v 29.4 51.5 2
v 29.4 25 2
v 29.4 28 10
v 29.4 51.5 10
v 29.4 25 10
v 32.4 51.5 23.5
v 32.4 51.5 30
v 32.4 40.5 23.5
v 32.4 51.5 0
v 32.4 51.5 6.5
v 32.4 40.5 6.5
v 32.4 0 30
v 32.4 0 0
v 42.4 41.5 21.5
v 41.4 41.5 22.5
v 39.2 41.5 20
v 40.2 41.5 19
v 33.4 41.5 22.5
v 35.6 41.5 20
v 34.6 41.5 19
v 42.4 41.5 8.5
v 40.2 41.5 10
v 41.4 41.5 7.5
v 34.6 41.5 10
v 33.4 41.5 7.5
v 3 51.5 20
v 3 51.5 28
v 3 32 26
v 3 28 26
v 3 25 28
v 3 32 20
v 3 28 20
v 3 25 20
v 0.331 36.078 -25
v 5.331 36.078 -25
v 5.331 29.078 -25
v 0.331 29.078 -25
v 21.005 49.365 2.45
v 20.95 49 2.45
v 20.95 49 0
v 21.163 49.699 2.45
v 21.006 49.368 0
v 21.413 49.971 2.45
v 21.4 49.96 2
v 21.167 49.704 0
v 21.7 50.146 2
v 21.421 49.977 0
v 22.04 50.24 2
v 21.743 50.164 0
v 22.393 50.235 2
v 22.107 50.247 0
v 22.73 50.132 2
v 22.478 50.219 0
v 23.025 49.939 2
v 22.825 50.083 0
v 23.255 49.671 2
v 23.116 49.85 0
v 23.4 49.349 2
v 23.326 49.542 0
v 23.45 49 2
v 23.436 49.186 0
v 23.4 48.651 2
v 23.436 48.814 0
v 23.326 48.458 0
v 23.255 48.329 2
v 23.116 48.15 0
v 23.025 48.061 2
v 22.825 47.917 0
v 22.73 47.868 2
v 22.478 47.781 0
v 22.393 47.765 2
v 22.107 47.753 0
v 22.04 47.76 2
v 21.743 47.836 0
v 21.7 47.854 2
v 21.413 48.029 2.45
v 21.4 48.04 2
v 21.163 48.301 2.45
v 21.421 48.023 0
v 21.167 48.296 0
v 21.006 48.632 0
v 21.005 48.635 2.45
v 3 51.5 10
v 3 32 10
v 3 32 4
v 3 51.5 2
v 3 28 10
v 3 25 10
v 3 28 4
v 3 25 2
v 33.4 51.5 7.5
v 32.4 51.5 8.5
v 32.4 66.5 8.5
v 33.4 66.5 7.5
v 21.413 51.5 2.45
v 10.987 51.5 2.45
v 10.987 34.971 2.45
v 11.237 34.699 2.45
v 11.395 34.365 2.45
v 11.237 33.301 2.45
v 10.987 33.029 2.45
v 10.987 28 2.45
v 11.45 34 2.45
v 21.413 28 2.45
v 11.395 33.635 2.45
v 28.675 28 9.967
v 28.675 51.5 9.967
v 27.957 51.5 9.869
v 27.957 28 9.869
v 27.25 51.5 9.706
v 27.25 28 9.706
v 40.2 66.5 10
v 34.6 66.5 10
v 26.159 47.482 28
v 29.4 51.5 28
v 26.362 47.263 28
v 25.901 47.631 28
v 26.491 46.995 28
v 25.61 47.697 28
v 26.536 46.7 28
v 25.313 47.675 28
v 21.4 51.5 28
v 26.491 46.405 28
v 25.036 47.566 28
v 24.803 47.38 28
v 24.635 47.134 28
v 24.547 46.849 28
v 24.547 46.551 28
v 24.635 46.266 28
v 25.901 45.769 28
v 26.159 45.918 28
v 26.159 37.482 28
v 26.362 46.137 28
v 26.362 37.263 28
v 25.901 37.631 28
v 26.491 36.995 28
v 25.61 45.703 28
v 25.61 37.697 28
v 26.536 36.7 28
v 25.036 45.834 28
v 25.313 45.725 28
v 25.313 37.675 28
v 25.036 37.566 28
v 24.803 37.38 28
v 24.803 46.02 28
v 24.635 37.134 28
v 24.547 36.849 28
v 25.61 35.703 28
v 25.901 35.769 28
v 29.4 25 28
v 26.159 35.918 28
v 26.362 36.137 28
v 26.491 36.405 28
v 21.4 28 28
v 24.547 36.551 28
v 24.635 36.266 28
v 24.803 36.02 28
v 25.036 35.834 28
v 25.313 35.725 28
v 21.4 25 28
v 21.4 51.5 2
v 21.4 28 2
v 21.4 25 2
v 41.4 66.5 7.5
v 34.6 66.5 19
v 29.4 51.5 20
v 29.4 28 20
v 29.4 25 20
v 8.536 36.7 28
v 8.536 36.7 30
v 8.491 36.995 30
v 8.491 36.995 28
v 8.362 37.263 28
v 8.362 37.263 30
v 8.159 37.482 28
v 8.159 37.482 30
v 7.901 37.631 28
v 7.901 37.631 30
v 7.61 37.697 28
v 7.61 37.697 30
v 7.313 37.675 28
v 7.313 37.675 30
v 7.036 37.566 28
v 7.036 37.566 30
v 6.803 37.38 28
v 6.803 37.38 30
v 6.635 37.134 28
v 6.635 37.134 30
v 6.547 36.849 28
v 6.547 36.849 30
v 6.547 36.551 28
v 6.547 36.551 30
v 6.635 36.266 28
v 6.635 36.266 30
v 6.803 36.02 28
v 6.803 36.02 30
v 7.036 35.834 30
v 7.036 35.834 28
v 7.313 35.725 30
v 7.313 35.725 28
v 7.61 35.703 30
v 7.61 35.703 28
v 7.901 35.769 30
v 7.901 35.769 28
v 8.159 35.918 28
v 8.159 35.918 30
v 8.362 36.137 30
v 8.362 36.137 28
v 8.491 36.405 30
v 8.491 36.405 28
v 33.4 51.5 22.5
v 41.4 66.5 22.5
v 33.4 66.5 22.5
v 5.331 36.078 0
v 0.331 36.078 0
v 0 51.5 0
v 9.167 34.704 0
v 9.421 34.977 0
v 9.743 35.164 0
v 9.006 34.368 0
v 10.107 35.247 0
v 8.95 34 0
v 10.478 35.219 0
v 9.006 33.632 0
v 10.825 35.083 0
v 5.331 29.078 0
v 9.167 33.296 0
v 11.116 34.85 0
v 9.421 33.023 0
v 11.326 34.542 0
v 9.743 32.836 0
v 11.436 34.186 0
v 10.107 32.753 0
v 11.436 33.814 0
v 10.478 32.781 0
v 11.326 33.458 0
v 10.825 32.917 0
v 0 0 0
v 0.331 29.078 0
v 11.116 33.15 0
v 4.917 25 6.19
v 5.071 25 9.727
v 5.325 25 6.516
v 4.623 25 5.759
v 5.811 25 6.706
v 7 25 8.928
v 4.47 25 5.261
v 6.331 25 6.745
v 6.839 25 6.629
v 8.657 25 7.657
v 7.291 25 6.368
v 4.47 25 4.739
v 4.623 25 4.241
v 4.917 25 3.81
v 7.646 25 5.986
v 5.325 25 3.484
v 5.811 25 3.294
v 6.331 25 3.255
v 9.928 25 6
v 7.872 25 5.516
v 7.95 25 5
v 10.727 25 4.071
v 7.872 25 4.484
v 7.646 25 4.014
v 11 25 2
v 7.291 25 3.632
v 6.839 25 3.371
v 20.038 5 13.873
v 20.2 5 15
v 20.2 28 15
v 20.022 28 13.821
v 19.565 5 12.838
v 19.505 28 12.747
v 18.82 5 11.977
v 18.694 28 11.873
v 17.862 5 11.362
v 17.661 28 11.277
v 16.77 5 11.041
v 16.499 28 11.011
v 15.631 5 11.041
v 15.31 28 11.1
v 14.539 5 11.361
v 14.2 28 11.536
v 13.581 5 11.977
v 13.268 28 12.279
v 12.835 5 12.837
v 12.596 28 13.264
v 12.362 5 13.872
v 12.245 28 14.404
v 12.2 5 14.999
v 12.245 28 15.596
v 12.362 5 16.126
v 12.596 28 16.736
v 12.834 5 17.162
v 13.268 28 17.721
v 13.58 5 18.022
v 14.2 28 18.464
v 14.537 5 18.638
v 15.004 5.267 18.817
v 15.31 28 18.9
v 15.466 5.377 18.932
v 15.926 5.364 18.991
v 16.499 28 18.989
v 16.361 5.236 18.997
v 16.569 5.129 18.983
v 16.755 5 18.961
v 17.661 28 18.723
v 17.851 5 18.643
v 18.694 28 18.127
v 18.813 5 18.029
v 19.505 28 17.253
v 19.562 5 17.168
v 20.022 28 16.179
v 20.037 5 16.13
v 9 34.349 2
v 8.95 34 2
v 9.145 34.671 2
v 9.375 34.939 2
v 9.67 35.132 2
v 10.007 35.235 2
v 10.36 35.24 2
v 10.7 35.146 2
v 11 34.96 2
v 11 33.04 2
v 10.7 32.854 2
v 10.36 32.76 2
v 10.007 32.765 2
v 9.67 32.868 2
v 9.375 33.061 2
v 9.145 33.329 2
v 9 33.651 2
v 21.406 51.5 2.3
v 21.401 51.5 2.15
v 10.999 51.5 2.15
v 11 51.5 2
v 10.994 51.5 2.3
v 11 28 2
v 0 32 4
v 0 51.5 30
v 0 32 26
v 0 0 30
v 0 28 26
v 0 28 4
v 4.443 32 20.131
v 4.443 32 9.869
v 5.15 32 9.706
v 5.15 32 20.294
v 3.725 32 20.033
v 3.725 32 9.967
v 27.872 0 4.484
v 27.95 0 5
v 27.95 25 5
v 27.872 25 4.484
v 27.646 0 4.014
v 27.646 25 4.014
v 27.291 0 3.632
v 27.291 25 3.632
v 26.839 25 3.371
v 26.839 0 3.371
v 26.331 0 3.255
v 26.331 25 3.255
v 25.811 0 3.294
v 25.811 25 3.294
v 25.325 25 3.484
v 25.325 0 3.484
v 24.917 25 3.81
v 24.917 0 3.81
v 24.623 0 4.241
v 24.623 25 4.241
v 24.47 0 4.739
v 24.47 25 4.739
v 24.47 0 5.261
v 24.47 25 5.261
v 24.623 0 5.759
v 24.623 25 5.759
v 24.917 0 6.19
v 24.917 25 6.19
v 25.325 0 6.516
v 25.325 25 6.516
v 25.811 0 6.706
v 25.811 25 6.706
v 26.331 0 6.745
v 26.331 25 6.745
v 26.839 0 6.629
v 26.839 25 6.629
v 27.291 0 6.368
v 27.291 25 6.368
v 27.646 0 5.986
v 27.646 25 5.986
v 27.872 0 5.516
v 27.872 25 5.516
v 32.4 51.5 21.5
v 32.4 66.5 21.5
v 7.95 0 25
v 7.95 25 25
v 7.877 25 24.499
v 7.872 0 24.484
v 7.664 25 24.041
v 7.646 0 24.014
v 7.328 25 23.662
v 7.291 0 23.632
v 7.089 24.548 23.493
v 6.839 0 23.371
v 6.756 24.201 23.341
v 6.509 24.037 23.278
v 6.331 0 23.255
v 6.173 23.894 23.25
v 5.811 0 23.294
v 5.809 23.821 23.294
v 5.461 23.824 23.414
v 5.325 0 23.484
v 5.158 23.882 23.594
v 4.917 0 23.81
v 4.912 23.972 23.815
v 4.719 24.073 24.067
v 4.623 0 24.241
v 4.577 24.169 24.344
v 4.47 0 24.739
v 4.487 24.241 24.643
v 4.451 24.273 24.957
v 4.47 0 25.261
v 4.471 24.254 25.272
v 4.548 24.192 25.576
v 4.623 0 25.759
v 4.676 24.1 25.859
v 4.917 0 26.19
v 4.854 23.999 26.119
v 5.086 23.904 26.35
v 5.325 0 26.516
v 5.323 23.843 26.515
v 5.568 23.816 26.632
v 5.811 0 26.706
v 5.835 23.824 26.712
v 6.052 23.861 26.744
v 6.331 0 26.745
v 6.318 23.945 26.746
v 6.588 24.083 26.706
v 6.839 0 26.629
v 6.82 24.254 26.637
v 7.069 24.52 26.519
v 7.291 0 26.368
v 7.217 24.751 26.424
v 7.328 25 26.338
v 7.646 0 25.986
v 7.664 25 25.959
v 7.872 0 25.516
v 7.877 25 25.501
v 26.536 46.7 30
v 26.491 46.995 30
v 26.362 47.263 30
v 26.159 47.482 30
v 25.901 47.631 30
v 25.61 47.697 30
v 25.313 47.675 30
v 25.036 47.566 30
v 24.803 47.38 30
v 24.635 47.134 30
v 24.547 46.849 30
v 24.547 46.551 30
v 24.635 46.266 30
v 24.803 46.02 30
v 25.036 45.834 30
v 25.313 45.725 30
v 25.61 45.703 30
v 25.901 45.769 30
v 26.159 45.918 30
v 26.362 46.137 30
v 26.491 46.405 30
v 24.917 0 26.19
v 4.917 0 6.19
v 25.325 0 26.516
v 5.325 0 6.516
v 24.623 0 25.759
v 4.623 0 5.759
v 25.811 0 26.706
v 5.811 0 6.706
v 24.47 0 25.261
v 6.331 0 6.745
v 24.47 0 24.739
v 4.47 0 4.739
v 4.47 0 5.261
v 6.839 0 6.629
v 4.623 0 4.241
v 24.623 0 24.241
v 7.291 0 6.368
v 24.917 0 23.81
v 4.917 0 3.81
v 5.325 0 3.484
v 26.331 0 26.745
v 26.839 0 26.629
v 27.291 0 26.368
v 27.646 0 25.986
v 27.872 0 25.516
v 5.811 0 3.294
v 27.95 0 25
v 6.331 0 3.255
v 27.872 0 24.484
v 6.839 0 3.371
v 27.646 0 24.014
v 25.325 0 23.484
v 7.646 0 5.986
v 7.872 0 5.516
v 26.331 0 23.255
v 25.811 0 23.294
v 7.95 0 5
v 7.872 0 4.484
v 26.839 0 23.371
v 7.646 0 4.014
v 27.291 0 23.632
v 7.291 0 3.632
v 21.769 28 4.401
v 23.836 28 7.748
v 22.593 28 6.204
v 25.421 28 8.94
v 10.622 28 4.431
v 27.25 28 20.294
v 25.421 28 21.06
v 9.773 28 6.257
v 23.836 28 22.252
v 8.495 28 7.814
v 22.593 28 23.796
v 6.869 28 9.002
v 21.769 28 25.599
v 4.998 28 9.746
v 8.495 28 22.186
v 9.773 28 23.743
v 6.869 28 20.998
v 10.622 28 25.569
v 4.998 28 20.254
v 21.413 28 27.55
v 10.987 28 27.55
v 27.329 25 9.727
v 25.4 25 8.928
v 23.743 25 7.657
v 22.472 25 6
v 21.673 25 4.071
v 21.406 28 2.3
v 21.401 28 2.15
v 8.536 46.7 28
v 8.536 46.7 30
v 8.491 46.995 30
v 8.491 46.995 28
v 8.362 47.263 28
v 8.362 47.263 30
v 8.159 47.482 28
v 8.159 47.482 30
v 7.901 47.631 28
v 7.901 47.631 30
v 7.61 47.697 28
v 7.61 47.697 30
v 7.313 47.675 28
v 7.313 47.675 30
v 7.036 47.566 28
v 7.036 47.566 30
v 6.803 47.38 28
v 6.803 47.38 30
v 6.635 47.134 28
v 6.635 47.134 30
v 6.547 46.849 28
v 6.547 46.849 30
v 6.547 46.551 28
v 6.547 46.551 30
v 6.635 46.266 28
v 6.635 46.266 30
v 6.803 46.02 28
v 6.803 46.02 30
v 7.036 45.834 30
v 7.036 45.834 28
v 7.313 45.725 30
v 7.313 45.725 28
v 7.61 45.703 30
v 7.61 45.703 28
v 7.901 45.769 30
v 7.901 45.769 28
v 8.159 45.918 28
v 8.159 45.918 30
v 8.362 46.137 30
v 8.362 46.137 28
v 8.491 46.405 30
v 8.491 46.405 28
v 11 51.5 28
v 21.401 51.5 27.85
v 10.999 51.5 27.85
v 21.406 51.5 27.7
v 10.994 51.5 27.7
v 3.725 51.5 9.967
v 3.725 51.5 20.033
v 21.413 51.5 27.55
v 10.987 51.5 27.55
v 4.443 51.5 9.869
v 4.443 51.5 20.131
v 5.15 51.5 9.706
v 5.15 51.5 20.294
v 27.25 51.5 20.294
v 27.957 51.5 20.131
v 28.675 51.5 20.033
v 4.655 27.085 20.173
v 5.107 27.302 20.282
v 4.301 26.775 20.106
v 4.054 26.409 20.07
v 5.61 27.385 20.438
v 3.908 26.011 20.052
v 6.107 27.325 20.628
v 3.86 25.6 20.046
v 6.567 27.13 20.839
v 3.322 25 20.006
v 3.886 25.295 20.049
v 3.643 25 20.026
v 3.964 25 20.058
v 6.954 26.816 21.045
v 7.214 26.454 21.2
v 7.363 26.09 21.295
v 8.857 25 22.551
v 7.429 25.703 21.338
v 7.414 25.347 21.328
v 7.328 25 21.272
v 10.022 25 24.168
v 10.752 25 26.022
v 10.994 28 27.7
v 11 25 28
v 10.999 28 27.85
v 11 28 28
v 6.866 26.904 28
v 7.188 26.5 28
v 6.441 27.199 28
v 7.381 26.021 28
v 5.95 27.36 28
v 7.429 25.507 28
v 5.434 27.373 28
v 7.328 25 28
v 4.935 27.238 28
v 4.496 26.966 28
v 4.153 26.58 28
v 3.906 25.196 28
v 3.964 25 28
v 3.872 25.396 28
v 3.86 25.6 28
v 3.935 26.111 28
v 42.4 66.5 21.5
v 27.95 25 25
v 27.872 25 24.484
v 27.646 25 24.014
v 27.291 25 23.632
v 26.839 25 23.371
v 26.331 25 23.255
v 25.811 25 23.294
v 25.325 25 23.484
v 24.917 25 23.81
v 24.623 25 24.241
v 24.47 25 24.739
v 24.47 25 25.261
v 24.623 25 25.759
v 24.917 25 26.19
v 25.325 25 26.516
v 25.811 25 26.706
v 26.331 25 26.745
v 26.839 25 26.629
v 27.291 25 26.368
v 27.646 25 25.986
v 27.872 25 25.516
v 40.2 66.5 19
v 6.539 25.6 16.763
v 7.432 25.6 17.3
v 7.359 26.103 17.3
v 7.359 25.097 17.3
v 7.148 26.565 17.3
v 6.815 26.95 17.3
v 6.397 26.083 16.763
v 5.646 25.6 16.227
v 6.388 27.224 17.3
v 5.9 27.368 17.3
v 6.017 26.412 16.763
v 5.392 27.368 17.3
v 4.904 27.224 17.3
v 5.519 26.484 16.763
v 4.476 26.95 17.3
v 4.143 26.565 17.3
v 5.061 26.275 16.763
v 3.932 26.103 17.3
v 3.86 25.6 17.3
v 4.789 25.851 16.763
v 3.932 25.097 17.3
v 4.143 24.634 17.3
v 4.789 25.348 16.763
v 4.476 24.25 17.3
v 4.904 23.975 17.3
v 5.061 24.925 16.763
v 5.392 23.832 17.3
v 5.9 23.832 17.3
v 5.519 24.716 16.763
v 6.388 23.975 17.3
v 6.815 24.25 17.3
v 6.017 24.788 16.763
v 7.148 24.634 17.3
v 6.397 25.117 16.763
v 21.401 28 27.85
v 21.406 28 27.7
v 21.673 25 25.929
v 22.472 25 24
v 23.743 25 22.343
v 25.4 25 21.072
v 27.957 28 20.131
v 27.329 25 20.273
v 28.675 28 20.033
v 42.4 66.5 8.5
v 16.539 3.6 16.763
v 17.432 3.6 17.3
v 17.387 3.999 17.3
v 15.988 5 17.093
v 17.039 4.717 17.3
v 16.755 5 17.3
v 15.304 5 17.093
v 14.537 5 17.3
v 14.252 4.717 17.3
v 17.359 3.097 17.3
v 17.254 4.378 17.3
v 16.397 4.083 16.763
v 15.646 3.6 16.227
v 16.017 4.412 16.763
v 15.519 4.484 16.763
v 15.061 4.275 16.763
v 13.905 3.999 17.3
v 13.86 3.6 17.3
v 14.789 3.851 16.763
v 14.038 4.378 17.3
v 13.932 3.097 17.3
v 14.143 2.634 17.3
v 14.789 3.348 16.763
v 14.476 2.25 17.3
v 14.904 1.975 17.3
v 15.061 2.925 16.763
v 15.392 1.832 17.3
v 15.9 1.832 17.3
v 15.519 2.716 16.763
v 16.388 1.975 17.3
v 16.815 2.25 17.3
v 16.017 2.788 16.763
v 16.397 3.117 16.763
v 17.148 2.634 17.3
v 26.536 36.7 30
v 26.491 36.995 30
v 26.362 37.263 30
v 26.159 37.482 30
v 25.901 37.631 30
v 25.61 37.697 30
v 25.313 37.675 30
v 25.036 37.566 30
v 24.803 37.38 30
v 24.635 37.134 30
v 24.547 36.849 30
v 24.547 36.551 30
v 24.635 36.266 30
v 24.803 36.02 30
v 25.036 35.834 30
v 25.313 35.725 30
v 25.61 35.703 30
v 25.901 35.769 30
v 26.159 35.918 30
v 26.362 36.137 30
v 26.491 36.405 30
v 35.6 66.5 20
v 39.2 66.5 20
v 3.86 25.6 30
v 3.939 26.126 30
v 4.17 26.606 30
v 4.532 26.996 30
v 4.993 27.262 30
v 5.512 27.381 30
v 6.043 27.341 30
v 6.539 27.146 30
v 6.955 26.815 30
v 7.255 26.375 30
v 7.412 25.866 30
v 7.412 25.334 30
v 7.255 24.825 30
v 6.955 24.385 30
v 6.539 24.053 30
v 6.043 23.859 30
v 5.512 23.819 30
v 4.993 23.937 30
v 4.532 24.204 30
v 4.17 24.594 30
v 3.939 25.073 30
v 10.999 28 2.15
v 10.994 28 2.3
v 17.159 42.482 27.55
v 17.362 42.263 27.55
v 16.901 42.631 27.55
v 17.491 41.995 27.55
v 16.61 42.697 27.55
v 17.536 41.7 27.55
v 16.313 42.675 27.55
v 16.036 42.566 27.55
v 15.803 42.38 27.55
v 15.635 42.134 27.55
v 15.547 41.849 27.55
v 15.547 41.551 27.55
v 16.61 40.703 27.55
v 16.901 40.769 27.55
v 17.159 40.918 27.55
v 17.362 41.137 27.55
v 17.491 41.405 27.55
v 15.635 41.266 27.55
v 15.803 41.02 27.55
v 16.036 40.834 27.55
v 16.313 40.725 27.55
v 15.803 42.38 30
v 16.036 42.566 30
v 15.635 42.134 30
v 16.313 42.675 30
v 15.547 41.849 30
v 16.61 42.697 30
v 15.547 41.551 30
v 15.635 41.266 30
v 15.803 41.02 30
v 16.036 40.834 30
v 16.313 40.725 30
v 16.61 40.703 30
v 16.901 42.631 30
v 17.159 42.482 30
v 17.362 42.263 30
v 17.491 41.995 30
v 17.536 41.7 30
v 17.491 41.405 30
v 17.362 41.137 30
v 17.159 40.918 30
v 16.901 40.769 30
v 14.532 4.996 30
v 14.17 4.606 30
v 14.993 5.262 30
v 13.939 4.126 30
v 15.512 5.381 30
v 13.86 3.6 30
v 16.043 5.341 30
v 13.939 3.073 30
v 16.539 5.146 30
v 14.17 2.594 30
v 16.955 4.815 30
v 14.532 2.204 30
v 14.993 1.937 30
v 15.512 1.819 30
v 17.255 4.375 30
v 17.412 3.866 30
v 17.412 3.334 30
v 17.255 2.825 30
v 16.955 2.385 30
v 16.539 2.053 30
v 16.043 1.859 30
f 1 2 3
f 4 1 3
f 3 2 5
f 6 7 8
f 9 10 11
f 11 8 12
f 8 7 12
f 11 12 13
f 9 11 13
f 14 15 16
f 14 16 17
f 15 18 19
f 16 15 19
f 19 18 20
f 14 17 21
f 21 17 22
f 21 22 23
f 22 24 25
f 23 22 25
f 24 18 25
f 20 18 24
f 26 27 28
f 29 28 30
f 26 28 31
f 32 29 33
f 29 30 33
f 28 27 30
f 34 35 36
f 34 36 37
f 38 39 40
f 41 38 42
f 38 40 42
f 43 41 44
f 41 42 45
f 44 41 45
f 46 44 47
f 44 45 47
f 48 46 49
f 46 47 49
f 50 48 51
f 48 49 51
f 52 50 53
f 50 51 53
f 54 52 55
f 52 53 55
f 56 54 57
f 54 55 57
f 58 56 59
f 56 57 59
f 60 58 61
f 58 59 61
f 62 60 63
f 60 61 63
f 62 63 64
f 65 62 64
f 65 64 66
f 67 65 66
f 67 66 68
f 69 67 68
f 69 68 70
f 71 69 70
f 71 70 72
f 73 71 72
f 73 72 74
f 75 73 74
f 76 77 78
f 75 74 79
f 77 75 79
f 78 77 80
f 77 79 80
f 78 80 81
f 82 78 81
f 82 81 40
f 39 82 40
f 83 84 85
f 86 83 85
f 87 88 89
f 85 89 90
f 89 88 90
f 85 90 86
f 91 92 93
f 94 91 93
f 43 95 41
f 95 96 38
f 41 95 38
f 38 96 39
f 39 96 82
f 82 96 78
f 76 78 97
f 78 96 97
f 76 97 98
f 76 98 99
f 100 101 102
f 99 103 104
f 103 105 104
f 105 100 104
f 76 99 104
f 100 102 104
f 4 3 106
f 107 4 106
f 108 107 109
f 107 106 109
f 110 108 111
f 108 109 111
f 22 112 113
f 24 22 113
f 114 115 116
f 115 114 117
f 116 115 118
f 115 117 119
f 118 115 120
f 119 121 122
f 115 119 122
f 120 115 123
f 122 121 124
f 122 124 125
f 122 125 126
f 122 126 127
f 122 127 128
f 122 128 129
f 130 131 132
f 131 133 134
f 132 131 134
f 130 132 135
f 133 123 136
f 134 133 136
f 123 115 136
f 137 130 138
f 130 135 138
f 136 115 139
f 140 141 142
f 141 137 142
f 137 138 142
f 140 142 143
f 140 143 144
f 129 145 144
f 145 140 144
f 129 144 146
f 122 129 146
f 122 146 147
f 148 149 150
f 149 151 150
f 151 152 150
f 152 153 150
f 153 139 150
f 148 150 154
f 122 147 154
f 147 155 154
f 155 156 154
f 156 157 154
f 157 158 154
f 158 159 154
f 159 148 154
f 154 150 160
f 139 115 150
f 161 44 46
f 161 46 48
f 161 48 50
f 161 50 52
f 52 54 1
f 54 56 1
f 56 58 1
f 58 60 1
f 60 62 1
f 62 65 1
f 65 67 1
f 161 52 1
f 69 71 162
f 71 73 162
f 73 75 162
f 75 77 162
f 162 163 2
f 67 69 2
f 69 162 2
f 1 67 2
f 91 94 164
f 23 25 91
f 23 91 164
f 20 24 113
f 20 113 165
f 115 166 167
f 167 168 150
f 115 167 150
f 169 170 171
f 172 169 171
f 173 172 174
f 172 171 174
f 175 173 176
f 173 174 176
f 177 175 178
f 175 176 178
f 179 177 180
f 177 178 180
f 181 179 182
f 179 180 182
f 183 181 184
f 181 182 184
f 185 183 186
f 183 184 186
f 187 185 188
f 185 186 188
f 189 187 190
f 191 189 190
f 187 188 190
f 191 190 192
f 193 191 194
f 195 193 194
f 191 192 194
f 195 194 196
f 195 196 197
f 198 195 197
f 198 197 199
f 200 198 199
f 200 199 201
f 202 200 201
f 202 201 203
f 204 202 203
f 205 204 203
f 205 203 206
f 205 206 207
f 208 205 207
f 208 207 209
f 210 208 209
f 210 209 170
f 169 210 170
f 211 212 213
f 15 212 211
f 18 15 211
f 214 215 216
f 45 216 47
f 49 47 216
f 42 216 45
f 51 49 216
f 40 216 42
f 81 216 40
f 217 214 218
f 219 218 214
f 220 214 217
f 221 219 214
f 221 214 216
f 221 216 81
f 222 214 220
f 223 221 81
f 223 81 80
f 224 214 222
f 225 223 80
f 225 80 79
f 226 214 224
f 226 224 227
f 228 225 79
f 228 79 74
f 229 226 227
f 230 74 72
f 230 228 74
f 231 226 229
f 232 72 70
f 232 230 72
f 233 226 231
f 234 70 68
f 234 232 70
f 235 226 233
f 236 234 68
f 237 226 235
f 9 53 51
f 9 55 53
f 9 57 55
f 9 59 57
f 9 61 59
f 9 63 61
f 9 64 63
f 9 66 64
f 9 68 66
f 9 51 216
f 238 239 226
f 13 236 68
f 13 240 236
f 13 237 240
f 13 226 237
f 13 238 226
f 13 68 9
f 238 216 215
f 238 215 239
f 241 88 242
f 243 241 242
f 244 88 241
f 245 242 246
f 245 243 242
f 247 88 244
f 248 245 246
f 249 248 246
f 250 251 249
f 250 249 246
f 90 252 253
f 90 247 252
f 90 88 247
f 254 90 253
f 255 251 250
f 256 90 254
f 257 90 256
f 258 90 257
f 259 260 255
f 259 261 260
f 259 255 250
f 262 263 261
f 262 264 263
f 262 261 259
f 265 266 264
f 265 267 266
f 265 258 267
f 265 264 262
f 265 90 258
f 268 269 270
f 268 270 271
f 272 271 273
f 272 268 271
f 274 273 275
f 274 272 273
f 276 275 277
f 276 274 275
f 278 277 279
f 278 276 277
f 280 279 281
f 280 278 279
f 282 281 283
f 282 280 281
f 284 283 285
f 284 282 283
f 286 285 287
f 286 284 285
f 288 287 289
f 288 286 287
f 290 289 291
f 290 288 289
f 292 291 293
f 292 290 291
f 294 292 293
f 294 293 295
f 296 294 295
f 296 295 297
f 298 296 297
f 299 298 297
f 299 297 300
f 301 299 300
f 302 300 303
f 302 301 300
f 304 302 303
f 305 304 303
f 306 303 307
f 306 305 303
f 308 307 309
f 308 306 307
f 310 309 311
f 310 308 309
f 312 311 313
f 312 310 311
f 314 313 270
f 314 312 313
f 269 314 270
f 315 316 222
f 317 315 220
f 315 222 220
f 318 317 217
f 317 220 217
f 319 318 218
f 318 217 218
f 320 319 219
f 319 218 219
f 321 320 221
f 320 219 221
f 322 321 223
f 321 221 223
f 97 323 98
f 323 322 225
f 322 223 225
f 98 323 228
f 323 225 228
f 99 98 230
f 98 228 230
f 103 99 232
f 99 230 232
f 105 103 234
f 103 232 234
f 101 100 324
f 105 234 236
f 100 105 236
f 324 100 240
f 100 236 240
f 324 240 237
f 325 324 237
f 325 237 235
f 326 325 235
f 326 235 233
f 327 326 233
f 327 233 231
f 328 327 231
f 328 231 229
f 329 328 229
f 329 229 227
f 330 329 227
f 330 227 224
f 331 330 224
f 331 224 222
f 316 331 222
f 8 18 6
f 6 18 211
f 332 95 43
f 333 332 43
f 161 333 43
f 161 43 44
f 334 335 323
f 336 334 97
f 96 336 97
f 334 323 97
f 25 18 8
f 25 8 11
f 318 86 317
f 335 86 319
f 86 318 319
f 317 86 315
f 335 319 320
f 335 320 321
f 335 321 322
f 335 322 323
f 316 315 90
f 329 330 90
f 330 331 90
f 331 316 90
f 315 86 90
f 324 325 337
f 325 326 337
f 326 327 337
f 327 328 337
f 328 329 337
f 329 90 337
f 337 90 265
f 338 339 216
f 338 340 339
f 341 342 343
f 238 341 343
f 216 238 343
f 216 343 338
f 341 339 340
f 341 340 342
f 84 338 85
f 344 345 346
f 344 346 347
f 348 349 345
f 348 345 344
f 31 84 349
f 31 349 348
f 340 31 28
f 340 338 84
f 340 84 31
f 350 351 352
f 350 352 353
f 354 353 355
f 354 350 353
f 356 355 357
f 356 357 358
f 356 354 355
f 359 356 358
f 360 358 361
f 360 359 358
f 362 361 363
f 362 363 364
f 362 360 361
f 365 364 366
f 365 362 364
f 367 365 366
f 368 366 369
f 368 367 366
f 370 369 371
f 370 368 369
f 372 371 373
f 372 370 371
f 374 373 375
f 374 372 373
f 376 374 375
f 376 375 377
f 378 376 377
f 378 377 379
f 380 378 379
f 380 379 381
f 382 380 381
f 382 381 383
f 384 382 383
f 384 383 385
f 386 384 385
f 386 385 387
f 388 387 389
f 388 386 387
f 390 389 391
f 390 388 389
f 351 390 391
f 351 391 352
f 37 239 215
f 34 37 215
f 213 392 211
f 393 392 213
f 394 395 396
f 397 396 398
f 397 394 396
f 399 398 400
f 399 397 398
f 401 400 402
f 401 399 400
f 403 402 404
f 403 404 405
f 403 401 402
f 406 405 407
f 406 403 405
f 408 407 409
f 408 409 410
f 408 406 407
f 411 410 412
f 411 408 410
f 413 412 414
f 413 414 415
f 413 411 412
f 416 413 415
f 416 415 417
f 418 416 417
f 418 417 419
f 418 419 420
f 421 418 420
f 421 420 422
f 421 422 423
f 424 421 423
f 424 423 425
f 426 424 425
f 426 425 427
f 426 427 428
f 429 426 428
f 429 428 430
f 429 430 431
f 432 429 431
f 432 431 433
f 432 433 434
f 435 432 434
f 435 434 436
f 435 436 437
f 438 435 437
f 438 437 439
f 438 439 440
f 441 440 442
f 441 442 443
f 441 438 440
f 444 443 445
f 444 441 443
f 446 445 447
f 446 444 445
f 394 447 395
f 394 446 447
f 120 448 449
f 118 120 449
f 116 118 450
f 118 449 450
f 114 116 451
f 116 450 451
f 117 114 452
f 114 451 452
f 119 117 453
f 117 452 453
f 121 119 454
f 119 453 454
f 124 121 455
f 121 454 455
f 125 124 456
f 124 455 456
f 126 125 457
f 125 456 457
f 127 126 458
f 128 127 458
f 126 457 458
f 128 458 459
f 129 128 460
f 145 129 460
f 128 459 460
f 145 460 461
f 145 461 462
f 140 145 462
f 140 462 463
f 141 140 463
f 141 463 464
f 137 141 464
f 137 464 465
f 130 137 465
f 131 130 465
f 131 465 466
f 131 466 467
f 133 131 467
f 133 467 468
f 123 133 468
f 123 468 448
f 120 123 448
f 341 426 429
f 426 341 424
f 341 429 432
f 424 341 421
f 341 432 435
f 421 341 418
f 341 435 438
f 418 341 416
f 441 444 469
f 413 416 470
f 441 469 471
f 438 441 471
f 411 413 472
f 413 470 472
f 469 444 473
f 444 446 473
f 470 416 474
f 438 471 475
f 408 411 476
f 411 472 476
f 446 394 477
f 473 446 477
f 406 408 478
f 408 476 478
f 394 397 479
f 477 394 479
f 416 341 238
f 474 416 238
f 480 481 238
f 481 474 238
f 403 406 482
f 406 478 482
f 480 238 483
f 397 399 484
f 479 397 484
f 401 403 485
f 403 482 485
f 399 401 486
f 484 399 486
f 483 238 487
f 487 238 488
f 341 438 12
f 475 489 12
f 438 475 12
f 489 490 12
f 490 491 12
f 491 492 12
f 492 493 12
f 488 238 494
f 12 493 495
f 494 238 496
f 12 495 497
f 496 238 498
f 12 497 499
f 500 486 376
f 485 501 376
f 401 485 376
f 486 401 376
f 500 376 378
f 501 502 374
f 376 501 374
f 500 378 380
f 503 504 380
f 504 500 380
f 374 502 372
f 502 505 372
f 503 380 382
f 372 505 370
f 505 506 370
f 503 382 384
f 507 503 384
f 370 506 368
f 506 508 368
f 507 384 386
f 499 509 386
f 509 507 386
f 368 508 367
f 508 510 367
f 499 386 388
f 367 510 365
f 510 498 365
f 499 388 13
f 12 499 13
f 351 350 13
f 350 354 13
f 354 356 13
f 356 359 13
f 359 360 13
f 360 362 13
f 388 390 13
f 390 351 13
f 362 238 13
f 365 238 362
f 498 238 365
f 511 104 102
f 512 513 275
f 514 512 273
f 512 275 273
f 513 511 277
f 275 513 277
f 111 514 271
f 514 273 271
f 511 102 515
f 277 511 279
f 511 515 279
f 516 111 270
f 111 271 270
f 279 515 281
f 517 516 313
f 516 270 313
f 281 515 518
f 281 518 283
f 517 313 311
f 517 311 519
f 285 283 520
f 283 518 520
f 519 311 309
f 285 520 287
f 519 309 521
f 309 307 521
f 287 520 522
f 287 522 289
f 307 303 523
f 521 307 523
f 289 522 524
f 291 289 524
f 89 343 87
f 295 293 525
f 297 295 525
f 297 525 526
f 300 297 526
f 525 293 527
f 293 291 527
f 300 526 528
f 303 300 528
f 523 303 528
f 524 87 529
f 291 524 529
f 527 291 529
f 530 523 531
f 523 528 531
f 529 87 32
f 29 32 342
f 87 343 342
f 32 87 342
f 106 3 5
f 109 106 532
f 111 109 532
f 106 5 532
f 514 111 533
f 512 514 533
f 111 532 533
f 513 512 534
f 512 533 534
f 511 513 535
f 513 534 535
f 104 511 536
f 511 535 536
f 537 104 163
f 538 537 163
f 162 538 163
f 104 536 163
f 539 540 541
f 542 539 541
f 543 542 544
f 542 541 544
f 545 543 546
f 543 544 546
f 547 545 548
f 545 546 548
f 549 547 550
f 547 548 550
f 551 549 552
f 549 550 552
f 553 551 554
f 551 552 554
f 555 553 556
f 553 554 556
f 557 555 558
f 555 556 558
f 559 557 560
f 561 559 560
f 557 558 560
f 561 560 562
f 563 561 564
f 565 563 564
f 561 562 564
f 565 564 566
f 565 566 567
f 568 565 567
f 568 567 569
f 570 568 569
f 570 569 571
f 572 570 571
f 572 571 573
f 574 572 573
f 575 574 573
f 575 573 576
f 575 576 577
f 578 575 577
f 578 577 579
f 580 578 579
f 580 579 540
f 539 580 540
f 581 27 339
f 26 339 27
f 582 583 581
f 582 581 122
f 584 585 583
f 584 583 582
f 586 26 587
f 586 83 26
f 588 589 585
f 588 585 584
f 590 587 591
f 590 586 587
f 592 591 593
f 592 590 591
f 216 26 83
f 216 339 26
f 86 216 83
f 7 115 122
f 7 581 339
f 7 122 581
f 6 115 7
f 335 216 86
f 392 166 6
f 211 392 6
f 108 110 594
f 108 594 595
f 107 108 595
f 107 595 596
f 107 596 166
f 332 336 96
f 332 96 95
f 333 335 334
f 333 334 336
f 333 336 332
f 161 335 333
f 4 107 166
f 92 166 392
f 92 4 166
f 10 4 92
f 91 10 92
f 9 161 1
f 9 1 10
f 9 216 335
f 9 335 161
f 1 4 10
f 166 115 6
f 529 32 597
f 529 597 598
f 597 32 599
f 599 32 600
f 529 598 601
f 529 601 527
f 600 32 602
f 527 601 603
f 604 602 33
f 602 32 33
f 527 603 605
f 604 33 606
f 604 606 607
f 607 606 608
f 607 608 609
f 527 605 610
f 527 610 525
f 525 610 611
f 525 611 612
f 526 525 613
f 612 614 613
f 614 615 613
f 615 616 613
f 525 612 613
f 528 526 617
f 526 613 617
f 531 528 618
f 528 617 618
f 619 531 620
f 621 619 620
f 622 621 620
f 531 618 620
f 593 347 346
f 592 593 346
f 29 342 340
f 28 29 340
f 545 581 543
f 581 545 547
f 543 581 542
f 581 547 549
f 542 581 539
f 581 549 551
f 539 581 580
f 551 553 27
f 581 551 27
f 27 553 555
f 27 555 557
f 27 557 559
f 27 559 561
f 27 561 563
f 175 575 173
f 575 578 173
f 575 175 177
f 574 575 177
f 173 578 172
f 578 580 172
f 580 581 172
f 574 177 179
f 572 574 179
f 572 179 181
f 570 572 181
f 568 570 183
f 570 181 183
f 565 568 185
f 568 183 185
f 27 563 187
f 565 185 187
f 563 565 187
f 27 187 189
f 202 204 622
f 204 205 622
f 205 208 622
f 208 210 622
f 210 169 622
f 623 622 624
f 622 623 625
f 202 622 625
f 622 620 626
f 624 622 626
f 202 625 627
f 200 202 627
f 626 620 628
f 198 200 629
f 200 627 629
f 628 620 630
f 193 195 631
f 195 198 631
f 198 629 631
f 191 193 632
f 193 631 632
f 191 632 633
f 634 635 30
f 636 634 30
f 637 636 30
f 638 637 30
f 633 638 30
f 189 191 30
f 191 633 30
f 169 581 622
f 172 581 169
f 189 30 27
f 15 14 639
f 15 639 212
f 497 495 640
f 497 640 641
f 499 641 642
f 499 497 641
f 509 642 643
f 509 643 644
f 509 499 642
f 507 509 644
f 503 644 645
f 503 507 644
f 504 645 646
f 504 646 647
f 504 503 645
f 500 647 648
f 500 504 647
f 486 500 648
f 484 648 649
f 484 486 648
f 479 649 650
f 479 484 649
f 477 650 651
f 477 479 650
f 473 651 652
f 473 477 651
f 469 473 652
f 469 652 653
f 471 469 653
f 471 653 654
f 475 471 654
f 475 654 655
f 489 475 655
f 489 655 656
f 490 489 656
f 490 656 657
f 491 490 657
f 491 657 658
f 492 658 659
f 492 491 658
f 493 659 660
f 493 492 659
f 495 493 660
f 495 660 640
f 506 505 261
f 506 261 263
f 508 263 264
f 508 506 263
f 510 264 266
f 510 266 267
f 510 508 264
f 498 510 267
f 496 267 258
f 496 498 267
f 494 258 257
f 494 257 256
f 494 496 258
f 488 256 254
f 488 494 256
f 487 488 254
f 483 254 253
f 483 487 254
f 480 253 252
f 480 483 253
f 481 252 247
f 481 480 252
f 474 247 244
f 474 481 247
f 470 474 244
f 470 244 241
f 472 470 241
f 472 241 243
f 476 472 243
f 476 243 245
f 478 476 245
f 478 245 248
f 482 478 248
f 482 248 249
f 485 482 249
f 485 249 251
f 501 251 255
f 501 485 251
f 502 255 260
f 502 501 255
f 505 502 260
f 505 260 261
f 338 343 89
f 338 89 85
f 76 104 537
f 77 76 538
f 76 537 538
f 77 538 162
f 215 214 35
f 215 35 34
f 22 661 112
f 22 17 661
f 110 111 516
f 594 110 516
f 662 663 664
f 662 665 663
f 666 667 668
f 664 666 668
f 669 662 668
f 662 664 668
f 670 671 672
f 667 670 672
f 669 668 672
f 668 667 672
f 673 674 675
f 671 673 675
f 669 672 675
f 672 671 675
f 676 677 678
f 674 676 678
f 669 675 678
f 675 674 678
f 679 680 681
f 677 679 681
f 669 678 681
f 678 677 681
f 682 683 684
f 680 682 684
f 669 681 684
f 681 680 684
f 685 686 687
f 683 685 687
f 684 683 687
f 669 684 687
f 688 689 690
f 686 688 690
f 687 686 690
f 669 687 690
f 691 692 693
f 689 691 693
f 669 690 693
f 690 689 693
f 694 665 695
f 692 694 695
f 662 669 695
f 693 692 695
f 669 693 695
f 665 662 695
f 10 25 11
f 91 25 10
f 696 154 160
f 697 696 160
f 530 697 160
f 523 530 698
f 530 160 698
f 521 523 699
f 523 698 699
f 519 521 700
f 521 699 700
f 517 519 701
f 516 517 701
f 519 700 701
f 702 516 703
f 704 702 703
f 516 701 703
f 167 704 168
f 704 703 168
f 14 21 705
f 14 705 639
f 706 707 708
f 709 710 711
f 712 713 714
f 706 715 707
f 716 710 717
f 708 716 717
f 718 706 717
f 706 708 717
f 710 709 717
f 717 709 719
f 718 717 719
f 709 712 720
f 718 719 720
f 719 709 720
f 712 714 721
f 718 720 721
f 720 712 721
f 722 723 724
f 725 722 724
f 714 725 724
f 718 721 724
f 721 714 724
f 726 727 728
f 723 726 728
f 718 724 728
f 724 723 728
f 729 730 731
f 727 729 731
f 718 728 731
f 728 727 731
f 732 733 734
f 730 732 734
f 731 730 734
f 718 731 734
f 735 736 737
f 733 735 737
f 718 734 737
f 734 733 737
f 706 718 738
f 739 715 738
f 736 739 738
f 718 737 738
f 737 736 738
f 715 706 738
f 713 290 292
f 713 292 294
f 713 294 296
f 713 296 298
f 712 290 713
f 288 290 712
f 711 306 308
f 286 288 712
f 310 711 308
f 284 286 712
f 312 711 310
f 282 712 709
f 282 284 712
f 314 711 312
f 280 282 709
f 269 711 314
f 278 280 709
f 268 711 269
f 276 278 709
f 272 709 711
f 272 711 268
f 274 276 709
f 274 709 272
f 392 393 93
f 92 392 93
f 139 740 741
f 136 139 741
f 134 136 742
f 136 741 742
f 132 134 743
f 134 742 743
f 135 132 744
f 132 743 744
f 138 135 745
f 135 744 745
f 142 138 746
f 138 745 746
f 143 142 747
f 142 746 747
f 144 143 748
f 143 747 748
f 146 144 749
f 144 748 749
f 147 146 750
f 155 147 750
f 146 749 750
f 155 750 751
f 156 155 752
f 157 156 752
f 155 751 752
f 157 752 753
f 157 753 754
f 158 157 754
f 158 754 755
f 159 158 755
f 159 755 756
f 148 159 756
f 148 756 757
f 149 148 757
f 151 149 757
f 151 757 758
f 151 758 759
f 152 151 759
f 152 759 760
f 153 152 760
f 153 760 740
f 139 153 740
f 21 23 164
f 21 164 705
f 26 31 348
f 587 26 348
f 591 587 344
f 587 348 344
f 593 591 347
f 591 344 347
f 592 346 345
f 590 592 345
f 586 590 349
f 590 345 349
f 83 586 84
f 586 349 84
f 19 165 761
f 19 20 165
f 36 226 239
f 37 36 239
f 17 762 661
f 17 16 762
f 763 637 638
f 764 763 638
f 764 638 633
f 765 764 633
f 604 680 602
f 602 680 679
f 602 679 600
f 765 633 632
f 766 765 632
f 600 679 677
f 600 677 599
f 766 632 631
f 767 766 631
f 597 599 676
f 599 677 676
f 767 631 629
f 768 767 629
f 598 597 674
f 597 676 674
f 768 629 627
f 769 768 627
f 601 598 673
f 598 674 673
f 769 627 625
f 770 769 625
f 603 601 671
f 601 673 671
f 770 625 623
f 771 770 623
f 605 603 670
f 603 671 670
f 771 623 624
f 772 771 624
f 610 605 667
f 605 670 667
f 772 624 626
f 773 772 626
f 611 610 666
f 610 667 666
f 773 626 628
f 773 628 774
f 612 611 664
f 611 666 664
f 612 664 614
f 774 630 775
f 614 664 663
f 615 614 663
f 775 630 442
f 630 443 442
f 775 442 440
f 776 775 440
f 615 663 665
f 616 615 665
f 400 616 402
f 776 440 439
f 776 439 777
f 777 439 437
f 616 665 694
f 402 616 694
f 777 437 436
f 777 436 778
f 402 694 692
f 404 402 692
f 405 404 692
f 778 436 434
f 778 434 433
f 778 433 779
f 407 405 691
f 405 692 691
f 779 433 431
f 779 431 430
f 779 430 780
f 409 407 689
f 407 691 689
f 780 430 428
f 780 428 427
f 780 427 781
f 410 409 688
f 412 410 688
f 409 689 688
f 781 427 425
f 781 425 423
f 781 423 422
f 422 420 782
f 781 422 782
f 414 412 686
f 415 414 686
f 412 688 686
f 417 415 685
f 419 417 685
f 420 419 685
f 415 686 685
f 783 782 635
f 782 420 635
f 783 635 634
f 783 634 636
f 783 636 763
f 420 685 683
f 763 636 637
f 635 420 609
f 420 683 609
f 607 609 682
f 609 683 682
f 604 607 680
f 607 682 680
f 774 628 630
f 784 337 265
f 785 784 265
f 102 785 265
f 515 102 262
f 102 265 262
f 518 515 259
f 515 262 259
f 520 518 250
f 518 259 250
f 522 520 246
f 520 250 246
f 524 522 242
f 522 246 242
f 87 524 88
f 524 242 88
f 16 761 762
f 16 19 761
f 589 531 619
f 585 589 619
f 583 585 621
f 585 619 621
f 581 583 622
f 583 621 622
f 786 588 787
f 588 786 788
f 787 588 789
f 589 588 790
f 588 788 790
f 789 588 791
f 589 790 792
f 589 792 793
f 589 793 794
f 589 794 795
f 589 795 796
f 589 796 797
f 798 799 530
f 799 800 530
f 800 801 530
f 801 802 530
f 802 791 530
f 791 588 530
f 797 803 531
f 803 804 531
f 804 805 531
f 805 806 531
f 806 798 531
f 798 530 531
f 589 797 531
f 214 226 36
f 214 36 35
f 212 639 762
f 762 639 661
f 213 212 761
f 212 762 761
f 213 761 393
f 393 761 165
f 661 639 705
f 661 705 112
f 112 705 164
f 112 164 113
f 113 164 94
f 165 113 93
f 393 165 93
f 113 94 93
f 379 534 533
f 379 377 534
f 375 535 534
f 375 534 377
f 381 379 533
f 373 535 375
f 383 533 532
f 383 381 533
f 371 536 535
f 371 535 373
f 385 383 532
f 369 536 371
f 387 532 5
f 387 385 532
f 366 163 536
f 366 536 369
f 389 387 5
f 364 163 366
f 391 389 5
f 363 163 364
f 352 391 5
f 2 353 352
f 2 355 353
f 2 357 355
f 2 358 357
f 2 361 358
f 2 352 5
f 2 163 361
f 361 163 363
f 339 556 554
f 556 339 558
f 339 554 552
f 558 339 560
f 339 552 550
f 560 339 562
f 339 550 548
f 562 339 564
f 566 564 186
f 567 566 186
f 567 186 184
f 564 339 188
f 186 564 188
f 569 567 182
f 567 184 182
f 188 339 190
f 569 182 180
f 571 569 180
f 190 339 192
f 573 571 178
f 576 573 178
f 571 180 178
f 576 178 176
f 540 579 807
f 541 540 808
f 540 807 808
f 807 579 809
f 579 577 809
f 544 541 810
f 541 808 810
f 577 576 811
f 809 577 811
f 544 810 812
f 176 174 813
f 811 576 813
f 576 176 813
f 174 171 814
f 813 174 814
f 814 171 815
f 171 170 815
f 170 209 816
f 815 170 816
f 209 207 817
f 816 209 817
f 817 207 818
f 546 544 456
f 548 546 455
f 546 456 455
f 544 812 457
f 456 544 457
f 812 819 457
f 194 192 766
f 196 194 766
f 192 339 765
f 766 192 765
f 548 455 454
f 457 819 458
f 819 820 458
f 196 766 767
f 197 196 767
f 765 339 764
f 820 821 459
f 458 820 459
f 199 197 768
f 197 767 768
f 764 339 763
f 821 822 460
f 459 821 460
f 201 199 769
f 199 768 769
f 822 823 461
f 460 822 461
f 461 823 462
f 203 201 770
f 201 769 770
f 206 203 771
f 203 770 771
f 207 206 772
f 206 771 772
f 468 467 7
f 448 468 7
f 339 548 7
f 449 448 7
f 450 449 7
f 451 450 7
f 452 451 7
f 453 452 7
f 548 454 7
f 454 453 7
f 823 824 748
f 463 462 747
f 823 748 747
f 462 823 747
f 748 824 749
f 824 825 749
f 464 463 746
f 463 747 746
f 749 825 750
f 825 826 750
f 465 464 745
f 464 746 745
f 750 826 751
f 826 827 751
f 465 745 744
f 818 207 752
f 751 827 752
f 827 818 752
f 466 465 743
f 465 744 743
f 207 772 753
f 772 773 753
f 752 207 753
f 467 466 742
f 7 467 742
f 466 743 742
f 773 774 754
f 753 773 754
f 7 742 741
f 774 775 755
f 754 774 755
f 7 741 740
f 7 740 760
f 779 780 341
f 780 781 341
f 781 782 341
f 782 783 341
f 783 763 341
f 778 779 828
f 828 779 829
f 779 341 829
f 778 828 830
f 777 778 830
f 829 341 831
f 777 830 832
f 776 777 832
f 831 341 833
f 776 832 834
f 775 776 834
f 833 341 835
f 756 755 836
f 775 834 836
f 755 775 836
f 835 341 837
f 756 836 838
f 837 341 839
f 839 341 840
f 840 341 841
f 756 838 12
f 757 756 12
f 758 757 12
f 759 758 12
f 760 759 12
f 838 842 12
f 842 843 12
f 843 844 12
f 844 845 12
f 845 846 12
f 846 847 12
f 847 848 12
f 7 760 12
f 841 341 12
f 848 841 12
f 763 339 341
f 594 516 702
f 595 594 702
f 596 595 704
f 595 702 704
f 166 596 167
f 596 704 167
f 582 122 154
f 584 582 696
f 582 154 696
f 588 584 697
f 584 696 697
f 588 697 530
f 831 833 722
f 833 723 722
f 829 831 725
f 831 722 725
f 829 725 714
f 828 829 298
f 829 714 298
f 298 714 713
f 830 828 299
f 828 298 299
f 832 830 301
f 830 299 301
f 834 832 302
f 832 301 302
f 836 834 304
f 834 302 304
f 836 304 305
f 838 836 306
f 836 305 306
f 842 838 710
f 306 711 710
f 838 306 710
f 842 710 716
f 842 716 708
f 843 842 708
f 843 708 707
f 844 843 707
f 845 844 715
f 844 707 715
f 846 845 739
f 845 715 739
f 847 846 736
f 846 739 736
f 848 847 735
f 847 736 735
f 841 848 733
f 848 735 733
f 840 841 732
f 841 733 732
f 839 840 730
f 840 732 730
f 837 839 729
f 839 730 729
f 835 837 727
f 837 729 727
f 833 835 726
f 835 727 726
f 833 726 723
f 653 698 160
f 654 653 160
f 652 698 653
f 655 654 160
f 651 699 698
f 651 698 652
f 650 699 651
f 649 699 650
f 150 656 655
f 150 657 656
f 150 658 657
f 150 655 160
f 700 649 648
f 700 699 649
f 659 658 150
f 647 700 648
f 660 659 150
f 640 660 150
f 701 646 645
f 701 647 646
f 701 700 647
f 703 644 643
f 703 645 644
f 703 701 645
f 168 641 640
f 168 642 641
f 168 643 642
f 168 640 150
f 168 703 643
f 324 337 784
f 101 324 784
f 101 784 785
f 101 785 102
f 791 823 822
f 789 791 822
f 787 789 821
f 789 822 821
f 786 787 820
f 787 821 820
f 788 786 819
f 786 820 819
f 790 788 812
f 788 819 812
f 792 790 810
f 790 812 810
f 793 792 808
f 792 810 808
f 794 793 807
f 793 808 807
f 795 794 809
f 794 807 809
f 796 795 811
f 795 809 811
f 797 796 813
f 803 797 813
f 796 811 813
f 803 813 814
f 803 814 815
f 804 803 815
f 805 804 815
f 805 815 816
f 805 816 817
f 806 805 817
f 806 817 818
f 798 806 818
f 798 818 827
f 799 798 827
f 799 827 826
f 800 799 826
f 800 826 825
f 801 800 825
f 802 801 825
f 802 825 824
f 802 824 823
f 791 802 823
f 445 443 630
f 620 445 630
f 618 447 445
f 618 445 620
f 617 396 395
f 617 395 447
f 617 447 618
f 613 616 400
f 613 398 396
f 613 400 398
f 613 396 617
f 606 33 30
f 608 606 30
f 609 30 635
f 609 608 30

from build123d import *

# Parameters (mm, degrees)
SKETCH1_W                         = 32.4
SKETCH1_H                         = 30
SKETCH1_R                         = 1.75
BOSS_EXTRUDE1_DEPTH               = 25
SKETCH2_R                         = 4
CUT_EXTRUDE1_DEPTH                = 20
SKETCH3_W                         = 32.4
SKETCH3_H                         = 30
SKETCH3_R                         = 4
BOSS_EXTRUDE2_DEPTH               = 3
SKETCH4_W                         = 32.4
SKETCH4_H                         = 30
BOSS_EXTRUDE3_DEPTH               = 23.5
SKETCH5_R                         = 1.25
CUT_EXTRUDE2_DEPTH                = 2.45
SKETCH6_W                         = 22
SKETCH6_H                         = 4
CUT_EXTRUDE3_DEPTH                = 5.15
SKETCH7_W                         = 15
SKETCH7_H                         = 10
BOSS_EXTRUDE4_DEPTH               = 10
SKETCH8_W                         = 5.6
SKETCH8_H                         = 10
CUT_EXTRUDE4_DEPTH                = 15
CHAMFER1_SIZE                     = 1
SKETCH11_R                        = 1
CUT_EXTRUDE5_DEPTH                = 5
CHAMFER3_SIZE                     = 1
BOSS_EXTRUDE6_DEPTH               = 15
CHAMFER5_SIZE                     = 1
F_3_32_0_140625_DOWEL_HOLE1_D     = 3.571875
F_3_32_0_140625_DOWEL_HOLE1_DEPTH = 12.7
F_3_32_0_140625_DOWEL_HOLE1_TIP   = 1.073099512
SKETCH19_W                        = 5
SKETCH19_H                        = 7
BOSS_EXTRUDE7_DEPTH               = 25


with BuildPart() as part:
    # Sketch1 → Boss-Extrude1 (new body)
    with BuildSketch(Plane(origin=(0, 0, 0), x_dir=(1, 0, 0), z_dir=(0, 1, 0))):
        with Locations((16.2, -15)):
            Rectangle(SKETCH1_W, SKETCH1_H)
        with Locations((6.2, -5)):
            Circle(SKETCH1_R, mode=Mode.SUBTRACT)
        with Locations((26.2, -5)):
            Circle(SKETCH1_R, mode=Mode.SUBTRACT)
        with Locations((26.2, -25)):
            Circle(SKETCH1_R, mode=Mode.SUBTRACT)
        with Locations((6.2, -25)):
            Circle(SKETCH1_R, mode=Mode.SUBTRACT)
    extrude(amount=BOSS_EXTRUDE1_DEPTH)

    # Sketch2 → Cut-Extrude1 (cut)
    with BuildSketch(Plane(origin=(0, 25, 0), x_dir=(1, 0, 0), z_dir=(0, 1, 0))):
        with Locations((16.2, -15)):
            Circle(SKETCH2_R)
    extrude(amount=-CUT_EXTRUDE1_DEPTH, mode=Mode.SUBTRACT)

    # Sketch3 → Boss-Extrude2 (add)
    with BuildSketch(Plane(origin=(0, 25, 0), x_dir=(1, 0, 0), z_dir=(0, 1, 0))):
        with Locations((16.2, -15)):
            Rectangle(SKETCH3_W, SKETCH3_H)
        Polygon((3, -20), (3, -10), (3, -2), (11, -2), (21.4, -2), (29.4, -2), (29.4, -10), (29.4, -20), (29.4, -28), (21.4, -28), (11, -28), (3, -28), align=None, mode=Mode.SUBTRACT)
        with BuildLine():
            ThreePointArc((11, -2), (8.656854249, -7.656854249), (3, -10))
            Line((3, -10), (3, -20))
            ThreePointArc((3, -20), (8.656854249, -22.343145751), (11, -28))
            Line((11, -28), (21.4, -28))
            ThreePointArc((21.4, -28), (23.743145751, -22.343145751), (29.4, -20))
            Line((29.4, -20), (29.4, -10))
            ThreePointArc((29.4, -10), (23.743145751, -7.656854249), (21.4, -2))
            Line((21.4, -2), (11, -2))
        make_face()
        with Locations((16.2, -15)):
            Circle(SKETCH3_R, mode=Mode.SUBTRACT)
    extrude(amount=BOSS_EXTRUDE2_DEPTH)

    # Sketch4 → Boss-Extrude3 (add)
    with BuildSketch(Plane(origin=(0, 28, 0), x_dir=(1, 0, 0), z_dir=(0, 1, 0))):
        with Locations((16.2, -15)):
            Rectangle(SKETCH4_W, SKETCH4_H)
        with BuildLine():
            Line((5.15, -20.294320277), (5.15, -9.705679723))
            ThreePointArc((5.15, -9.705679723), (4.085025855, -9.926078406), (3, -10))
            Line((3, -10), (3, -2))
            Line((3, -2), (11, -2))
            ThreePointArc((11, -2), (10.996832804, -2.225089113), (10.987333723, -2.45))
            Line((10.987333723, -2.45), (21.412666277, -2.45))
            ThreePointArc((21.412666277, -2.45), (21.403167196, -2.225089113), (21.4, -2))
            Line((21.4, -2), (29.4, -2))
            Line((29.4, -2), (29.4, -10))
            ThreePointArc((29.4, -10), (28.314974145, -9.926078406), (27.25, -9.705679723))
            Line((27.25, -9.705679723), (27.25, -20.294320277))
            ThreePointArc((27.25, -20.294320277), (28.314974145, -20.073921594), (29.4, -20))
            Line((29.4, -20), (29.4, -28))
            Line((29.4, -28), (21.4, -28))
            ThreePointArc((21.4, -28), (21.403167196, -27.774910887), (21.412666277, -27.55))
            Line((21.412666277, -27.55), (10.987333723, -27.55))
            ThreePointArc((10.987333723, -27.55), (10.996832804, -27.774910887), (11, -28))
            Line((11, -28), (3, -28))
            Line((3, -28), (3, -20))
            ThreePointArc((3, -20), (4.085025855, -20.073921594), (5.15, -20.294320277))
        make_face(mode=Mode.SUBTRACT)
    extrude(amount=BOSS_EXTRUDE3_DEPTH)

    # Sketch5 → Cut-Extrude2 (cut)
    with BuildSketch(Plane(origin=(0, 0, 0), x_dir=(-1, 0, 0), z_dir=(0, 0, -1))):
        with Locations((-22.2, 49)):
            Circle(SKETCH5_R)
        with Locations((-10.2, 34)):
            Circle(SKETCH5_R)
    extrude(amount=-CUT_EXTRUDE2_DEPTH, mode=Mode.SUBTRACT)

    # Sketch6 → Cut-Extrude3 (cut)
    with BuildSketch(Plane.ZY):
        with Locations((15, 30)):
            Rectangle(SKETCH6_W, SKETCH6_H)
    extrude(amount=-CUT_EXTRUDE3_DEPTH, mode=Mode.SUBTRACT)

    # Sketch7 → Boss-Extrude4 (add)
    with BuildSketch(Plane(origin=(32.4, 0, 0), x_dir=(0, 0, -1), z_dir=(1, 0, 0))):
        with Locations((-15, 46.5)):
            Rectangle(SKETCH7_W, SKETCH7_H)
    extrude(amount=BOSS_EXTRUDE4_DEPTH)

    # Sketch8 → Cut-Extrude4 (cut)
    with BuildSketch(Plane(origin=(0, 51.5, 0), x_dir=(1, 0, 0), z_dir=(0, 1, 0))):
        with Locations((37.4, -15)):
            Rectangle(SKETCH8_W, SKETCH8_H)
    extrude(amount=-CUT_EXTRUDE4_DEPTH, mode=Mode.SUBTRACT)

    # Chamfer1
    chamfer1_edges = [part.edges().sort_by_distance(p)[0] for p in [
        (34.6, 46.5, 20),
        (40.2, 46.5, 20),
    ]]
    chamfer(chamfer1_edges, length=CHAMFER1_SIZE)

    # Sketch11 → Cut-Extrude5 (cut)
    with BuildSketch(Plane.XY.offset(30)):
        with Locations((7.535754107, 46.7)):
            Circle(SKETCH11_R)
        with Locations((25.535754107, 46.7)):
            Circle(SKETCH11_R)
        with Locations((7.535754107, 36.7)):
            Circle(SKETCH11_R)
        with Locations((25.535754107, 36.7)):
            Circle(SKETCH11_R)
        with Locations((16.535754107, 41.7)):
            Circle(SKETCH11_R)
    extrude(amount=-CUT_EXTRUDE5_DEPTH, mode=Mode.SUBTRACT)

    # Chamfer3
    chamfer3_edges = [part.edges().sort_by_distance(p)[0] for p in [
        (32.4, 46.5, 7.5),
        (32.4, 46.5, 22.5),
        (32.4, 41.5, 15),
        (42.4, 46.5, 7.5),
        (42.4, 46.5, 22.5),
    ]]
    chamfer(chamfer3_edges, length=CHAMFER3_SIZE)

    # Sketch15 → Boss-Extrude6 (add)
    with BuildSketch(Plane(origin=(0, 51.5, 0), x_dir=(1, 0, 0), z_dir=(0, 1, 0))):
        Polygon((32.4, -7.5), (41.4, -7.5), (42.4, -8.5), (42.4, -21.5), (41.4, -22.5), (32.4, -22.5), align=None)
        Polygon((34.6, -10), (34.6, -19), (35.6, -20), (39.2, -20), (40.2, -19), (40.2, -10), align=None, mode=Mode.SUBTRACT)
    extrude(amount=BOSS_EXTRUDE6_DEPTH)

    # Chamfer5
    chamfer5_edges = [part.edges().sort_by_distance(p)[0] for p in [
        (32.4, 59, 7.5),
        (32.4, 59, 22.5),
    ]]
    chamfer(chamfer5_edges, length=CHAMFER5_SIZE)

    # 3/32 (0.140625) Dowel Hole1
    with Locations(Plane.XY.offset(30)):
        with Locations((5.645879952, 25.599824203), (15.645879952, 3.599824203)):
            Hole(F_3_32_0_140625_DOWEL_HOLE1_D / 2, depth=F_3_32_0_140625_DOWEL_HOLE1_DEPTH)
            with Locations((0, 0, -(F_3_32_0_140625_DOWEL_HOLE1_DEPTH + F_3_32_0_140625_DOWEL_HOLE1_TIP / 2))):  # 118° drill point
                Cone(0, F_3_32_0_140625_DOWEL_HOLE1_D / 2, F_3_32_0_140625_DOWEL_HOLE1_TIP, mode=Mode.SUBTRACT)

    # Sketch19 → Boss-Extrude7 (add)
    with BuildSketch(Plane(origin=(0, 0, 0), x_dir=(-1, 0, 0), z_dir=(0, 0, -1))):
        with Locations((-2.83125, 32.5777)):
            Rectangle(SKETCH19_W, SKETCH19_H)
    extrude(amount=BOSS_EXTRUDE7_DEPTH)


solid = part.part
